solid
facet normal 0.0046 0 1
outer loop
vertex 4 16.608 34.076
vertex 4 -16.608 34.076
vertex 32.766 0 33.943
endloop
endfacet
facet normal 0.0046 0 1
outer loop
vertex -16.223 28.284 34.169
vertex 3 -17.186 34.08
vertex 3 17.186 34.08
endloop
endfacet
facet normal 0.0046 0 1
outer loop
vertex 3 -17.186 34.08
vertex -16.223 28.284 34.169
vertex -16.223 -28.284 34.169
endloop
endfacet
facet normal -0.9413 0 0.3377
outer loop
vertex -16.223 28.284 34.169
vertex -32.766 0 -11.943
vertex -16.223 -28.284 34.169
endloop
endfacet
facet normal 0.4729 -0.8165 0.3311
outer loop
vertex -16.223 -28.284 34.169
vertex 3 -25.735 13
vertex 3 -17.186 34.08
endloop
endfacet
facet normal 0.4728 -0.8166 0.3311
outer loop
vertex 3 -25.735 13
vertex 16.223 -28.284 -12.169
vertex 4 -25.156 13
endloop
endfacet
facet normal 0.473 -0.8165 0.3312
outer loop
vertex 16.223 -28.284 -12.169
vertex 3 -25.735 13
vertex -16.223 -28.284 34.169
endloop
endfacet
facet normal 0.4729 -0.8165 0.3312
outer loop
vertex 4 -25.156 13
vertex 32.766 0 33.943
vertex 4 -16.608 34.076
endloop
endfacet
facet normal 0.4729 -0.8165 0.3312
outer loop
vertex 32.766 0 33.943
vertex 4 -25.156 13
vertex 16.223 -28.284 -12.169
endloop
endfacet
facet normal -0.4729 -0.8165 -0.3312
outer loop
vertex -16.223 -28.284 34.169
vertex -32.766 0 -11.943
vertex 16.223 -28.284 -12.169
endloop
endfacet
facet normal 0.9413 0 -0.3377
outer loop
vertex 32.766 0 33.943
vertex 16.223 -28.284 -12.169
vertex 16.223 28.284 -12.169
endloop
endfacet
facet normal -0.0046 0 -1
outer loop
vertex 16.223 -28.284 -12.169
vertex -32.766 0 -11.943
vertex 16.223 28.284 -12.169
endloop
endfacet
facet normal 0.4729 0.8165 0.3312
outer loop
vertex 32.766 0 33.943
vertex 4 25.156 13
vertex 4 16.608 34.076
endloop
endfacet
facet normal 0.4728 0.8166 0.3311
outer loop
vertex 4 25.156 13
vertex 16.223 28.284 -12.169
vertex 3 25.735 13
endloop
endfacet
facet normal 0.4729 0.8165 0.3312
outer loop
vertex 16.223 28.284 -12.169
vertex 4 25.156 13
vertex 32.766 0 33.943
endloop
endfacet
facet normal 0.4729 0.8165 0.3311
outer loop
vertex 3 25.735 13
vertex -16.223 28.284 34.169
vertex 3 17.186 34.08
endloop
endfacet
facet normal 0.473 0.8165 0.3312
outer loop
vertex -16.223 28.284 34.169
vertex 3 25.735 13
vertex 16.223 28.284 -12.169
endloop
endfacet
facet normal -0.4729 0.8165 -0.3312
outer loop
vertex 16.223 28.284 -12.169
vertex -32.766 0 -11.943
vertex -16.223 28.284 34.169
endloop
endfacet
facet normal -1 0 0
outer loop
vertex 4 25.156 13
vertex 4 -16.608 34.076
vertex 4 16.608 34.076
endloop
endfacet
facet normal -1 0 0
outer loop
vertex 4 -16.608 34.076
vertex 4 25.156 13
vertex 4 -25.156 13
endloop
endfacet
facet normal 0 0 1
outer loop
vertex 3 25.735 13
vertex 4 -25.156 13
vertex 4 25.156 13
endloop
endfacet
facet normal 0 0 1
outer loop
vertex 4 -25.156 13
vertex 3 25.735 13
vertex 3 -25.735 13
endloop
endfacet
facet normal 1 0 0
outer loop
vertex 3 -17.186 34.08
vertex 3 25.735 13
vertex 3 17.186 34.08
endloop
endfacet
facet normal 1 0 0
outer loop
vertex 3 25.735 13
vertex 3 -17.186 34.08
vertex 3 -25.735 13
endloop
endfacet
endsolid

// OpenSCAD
difference(){
translate([0,0,11])
rotate([45,-35,00])
union(){
cylinder(40,40,00,$fn=4);
rotate([180,0,0])
cylinder(40,40,00,$fn=4);
}

translate([3,-50,13])
color("red")
cube([1,100,100]);
}
